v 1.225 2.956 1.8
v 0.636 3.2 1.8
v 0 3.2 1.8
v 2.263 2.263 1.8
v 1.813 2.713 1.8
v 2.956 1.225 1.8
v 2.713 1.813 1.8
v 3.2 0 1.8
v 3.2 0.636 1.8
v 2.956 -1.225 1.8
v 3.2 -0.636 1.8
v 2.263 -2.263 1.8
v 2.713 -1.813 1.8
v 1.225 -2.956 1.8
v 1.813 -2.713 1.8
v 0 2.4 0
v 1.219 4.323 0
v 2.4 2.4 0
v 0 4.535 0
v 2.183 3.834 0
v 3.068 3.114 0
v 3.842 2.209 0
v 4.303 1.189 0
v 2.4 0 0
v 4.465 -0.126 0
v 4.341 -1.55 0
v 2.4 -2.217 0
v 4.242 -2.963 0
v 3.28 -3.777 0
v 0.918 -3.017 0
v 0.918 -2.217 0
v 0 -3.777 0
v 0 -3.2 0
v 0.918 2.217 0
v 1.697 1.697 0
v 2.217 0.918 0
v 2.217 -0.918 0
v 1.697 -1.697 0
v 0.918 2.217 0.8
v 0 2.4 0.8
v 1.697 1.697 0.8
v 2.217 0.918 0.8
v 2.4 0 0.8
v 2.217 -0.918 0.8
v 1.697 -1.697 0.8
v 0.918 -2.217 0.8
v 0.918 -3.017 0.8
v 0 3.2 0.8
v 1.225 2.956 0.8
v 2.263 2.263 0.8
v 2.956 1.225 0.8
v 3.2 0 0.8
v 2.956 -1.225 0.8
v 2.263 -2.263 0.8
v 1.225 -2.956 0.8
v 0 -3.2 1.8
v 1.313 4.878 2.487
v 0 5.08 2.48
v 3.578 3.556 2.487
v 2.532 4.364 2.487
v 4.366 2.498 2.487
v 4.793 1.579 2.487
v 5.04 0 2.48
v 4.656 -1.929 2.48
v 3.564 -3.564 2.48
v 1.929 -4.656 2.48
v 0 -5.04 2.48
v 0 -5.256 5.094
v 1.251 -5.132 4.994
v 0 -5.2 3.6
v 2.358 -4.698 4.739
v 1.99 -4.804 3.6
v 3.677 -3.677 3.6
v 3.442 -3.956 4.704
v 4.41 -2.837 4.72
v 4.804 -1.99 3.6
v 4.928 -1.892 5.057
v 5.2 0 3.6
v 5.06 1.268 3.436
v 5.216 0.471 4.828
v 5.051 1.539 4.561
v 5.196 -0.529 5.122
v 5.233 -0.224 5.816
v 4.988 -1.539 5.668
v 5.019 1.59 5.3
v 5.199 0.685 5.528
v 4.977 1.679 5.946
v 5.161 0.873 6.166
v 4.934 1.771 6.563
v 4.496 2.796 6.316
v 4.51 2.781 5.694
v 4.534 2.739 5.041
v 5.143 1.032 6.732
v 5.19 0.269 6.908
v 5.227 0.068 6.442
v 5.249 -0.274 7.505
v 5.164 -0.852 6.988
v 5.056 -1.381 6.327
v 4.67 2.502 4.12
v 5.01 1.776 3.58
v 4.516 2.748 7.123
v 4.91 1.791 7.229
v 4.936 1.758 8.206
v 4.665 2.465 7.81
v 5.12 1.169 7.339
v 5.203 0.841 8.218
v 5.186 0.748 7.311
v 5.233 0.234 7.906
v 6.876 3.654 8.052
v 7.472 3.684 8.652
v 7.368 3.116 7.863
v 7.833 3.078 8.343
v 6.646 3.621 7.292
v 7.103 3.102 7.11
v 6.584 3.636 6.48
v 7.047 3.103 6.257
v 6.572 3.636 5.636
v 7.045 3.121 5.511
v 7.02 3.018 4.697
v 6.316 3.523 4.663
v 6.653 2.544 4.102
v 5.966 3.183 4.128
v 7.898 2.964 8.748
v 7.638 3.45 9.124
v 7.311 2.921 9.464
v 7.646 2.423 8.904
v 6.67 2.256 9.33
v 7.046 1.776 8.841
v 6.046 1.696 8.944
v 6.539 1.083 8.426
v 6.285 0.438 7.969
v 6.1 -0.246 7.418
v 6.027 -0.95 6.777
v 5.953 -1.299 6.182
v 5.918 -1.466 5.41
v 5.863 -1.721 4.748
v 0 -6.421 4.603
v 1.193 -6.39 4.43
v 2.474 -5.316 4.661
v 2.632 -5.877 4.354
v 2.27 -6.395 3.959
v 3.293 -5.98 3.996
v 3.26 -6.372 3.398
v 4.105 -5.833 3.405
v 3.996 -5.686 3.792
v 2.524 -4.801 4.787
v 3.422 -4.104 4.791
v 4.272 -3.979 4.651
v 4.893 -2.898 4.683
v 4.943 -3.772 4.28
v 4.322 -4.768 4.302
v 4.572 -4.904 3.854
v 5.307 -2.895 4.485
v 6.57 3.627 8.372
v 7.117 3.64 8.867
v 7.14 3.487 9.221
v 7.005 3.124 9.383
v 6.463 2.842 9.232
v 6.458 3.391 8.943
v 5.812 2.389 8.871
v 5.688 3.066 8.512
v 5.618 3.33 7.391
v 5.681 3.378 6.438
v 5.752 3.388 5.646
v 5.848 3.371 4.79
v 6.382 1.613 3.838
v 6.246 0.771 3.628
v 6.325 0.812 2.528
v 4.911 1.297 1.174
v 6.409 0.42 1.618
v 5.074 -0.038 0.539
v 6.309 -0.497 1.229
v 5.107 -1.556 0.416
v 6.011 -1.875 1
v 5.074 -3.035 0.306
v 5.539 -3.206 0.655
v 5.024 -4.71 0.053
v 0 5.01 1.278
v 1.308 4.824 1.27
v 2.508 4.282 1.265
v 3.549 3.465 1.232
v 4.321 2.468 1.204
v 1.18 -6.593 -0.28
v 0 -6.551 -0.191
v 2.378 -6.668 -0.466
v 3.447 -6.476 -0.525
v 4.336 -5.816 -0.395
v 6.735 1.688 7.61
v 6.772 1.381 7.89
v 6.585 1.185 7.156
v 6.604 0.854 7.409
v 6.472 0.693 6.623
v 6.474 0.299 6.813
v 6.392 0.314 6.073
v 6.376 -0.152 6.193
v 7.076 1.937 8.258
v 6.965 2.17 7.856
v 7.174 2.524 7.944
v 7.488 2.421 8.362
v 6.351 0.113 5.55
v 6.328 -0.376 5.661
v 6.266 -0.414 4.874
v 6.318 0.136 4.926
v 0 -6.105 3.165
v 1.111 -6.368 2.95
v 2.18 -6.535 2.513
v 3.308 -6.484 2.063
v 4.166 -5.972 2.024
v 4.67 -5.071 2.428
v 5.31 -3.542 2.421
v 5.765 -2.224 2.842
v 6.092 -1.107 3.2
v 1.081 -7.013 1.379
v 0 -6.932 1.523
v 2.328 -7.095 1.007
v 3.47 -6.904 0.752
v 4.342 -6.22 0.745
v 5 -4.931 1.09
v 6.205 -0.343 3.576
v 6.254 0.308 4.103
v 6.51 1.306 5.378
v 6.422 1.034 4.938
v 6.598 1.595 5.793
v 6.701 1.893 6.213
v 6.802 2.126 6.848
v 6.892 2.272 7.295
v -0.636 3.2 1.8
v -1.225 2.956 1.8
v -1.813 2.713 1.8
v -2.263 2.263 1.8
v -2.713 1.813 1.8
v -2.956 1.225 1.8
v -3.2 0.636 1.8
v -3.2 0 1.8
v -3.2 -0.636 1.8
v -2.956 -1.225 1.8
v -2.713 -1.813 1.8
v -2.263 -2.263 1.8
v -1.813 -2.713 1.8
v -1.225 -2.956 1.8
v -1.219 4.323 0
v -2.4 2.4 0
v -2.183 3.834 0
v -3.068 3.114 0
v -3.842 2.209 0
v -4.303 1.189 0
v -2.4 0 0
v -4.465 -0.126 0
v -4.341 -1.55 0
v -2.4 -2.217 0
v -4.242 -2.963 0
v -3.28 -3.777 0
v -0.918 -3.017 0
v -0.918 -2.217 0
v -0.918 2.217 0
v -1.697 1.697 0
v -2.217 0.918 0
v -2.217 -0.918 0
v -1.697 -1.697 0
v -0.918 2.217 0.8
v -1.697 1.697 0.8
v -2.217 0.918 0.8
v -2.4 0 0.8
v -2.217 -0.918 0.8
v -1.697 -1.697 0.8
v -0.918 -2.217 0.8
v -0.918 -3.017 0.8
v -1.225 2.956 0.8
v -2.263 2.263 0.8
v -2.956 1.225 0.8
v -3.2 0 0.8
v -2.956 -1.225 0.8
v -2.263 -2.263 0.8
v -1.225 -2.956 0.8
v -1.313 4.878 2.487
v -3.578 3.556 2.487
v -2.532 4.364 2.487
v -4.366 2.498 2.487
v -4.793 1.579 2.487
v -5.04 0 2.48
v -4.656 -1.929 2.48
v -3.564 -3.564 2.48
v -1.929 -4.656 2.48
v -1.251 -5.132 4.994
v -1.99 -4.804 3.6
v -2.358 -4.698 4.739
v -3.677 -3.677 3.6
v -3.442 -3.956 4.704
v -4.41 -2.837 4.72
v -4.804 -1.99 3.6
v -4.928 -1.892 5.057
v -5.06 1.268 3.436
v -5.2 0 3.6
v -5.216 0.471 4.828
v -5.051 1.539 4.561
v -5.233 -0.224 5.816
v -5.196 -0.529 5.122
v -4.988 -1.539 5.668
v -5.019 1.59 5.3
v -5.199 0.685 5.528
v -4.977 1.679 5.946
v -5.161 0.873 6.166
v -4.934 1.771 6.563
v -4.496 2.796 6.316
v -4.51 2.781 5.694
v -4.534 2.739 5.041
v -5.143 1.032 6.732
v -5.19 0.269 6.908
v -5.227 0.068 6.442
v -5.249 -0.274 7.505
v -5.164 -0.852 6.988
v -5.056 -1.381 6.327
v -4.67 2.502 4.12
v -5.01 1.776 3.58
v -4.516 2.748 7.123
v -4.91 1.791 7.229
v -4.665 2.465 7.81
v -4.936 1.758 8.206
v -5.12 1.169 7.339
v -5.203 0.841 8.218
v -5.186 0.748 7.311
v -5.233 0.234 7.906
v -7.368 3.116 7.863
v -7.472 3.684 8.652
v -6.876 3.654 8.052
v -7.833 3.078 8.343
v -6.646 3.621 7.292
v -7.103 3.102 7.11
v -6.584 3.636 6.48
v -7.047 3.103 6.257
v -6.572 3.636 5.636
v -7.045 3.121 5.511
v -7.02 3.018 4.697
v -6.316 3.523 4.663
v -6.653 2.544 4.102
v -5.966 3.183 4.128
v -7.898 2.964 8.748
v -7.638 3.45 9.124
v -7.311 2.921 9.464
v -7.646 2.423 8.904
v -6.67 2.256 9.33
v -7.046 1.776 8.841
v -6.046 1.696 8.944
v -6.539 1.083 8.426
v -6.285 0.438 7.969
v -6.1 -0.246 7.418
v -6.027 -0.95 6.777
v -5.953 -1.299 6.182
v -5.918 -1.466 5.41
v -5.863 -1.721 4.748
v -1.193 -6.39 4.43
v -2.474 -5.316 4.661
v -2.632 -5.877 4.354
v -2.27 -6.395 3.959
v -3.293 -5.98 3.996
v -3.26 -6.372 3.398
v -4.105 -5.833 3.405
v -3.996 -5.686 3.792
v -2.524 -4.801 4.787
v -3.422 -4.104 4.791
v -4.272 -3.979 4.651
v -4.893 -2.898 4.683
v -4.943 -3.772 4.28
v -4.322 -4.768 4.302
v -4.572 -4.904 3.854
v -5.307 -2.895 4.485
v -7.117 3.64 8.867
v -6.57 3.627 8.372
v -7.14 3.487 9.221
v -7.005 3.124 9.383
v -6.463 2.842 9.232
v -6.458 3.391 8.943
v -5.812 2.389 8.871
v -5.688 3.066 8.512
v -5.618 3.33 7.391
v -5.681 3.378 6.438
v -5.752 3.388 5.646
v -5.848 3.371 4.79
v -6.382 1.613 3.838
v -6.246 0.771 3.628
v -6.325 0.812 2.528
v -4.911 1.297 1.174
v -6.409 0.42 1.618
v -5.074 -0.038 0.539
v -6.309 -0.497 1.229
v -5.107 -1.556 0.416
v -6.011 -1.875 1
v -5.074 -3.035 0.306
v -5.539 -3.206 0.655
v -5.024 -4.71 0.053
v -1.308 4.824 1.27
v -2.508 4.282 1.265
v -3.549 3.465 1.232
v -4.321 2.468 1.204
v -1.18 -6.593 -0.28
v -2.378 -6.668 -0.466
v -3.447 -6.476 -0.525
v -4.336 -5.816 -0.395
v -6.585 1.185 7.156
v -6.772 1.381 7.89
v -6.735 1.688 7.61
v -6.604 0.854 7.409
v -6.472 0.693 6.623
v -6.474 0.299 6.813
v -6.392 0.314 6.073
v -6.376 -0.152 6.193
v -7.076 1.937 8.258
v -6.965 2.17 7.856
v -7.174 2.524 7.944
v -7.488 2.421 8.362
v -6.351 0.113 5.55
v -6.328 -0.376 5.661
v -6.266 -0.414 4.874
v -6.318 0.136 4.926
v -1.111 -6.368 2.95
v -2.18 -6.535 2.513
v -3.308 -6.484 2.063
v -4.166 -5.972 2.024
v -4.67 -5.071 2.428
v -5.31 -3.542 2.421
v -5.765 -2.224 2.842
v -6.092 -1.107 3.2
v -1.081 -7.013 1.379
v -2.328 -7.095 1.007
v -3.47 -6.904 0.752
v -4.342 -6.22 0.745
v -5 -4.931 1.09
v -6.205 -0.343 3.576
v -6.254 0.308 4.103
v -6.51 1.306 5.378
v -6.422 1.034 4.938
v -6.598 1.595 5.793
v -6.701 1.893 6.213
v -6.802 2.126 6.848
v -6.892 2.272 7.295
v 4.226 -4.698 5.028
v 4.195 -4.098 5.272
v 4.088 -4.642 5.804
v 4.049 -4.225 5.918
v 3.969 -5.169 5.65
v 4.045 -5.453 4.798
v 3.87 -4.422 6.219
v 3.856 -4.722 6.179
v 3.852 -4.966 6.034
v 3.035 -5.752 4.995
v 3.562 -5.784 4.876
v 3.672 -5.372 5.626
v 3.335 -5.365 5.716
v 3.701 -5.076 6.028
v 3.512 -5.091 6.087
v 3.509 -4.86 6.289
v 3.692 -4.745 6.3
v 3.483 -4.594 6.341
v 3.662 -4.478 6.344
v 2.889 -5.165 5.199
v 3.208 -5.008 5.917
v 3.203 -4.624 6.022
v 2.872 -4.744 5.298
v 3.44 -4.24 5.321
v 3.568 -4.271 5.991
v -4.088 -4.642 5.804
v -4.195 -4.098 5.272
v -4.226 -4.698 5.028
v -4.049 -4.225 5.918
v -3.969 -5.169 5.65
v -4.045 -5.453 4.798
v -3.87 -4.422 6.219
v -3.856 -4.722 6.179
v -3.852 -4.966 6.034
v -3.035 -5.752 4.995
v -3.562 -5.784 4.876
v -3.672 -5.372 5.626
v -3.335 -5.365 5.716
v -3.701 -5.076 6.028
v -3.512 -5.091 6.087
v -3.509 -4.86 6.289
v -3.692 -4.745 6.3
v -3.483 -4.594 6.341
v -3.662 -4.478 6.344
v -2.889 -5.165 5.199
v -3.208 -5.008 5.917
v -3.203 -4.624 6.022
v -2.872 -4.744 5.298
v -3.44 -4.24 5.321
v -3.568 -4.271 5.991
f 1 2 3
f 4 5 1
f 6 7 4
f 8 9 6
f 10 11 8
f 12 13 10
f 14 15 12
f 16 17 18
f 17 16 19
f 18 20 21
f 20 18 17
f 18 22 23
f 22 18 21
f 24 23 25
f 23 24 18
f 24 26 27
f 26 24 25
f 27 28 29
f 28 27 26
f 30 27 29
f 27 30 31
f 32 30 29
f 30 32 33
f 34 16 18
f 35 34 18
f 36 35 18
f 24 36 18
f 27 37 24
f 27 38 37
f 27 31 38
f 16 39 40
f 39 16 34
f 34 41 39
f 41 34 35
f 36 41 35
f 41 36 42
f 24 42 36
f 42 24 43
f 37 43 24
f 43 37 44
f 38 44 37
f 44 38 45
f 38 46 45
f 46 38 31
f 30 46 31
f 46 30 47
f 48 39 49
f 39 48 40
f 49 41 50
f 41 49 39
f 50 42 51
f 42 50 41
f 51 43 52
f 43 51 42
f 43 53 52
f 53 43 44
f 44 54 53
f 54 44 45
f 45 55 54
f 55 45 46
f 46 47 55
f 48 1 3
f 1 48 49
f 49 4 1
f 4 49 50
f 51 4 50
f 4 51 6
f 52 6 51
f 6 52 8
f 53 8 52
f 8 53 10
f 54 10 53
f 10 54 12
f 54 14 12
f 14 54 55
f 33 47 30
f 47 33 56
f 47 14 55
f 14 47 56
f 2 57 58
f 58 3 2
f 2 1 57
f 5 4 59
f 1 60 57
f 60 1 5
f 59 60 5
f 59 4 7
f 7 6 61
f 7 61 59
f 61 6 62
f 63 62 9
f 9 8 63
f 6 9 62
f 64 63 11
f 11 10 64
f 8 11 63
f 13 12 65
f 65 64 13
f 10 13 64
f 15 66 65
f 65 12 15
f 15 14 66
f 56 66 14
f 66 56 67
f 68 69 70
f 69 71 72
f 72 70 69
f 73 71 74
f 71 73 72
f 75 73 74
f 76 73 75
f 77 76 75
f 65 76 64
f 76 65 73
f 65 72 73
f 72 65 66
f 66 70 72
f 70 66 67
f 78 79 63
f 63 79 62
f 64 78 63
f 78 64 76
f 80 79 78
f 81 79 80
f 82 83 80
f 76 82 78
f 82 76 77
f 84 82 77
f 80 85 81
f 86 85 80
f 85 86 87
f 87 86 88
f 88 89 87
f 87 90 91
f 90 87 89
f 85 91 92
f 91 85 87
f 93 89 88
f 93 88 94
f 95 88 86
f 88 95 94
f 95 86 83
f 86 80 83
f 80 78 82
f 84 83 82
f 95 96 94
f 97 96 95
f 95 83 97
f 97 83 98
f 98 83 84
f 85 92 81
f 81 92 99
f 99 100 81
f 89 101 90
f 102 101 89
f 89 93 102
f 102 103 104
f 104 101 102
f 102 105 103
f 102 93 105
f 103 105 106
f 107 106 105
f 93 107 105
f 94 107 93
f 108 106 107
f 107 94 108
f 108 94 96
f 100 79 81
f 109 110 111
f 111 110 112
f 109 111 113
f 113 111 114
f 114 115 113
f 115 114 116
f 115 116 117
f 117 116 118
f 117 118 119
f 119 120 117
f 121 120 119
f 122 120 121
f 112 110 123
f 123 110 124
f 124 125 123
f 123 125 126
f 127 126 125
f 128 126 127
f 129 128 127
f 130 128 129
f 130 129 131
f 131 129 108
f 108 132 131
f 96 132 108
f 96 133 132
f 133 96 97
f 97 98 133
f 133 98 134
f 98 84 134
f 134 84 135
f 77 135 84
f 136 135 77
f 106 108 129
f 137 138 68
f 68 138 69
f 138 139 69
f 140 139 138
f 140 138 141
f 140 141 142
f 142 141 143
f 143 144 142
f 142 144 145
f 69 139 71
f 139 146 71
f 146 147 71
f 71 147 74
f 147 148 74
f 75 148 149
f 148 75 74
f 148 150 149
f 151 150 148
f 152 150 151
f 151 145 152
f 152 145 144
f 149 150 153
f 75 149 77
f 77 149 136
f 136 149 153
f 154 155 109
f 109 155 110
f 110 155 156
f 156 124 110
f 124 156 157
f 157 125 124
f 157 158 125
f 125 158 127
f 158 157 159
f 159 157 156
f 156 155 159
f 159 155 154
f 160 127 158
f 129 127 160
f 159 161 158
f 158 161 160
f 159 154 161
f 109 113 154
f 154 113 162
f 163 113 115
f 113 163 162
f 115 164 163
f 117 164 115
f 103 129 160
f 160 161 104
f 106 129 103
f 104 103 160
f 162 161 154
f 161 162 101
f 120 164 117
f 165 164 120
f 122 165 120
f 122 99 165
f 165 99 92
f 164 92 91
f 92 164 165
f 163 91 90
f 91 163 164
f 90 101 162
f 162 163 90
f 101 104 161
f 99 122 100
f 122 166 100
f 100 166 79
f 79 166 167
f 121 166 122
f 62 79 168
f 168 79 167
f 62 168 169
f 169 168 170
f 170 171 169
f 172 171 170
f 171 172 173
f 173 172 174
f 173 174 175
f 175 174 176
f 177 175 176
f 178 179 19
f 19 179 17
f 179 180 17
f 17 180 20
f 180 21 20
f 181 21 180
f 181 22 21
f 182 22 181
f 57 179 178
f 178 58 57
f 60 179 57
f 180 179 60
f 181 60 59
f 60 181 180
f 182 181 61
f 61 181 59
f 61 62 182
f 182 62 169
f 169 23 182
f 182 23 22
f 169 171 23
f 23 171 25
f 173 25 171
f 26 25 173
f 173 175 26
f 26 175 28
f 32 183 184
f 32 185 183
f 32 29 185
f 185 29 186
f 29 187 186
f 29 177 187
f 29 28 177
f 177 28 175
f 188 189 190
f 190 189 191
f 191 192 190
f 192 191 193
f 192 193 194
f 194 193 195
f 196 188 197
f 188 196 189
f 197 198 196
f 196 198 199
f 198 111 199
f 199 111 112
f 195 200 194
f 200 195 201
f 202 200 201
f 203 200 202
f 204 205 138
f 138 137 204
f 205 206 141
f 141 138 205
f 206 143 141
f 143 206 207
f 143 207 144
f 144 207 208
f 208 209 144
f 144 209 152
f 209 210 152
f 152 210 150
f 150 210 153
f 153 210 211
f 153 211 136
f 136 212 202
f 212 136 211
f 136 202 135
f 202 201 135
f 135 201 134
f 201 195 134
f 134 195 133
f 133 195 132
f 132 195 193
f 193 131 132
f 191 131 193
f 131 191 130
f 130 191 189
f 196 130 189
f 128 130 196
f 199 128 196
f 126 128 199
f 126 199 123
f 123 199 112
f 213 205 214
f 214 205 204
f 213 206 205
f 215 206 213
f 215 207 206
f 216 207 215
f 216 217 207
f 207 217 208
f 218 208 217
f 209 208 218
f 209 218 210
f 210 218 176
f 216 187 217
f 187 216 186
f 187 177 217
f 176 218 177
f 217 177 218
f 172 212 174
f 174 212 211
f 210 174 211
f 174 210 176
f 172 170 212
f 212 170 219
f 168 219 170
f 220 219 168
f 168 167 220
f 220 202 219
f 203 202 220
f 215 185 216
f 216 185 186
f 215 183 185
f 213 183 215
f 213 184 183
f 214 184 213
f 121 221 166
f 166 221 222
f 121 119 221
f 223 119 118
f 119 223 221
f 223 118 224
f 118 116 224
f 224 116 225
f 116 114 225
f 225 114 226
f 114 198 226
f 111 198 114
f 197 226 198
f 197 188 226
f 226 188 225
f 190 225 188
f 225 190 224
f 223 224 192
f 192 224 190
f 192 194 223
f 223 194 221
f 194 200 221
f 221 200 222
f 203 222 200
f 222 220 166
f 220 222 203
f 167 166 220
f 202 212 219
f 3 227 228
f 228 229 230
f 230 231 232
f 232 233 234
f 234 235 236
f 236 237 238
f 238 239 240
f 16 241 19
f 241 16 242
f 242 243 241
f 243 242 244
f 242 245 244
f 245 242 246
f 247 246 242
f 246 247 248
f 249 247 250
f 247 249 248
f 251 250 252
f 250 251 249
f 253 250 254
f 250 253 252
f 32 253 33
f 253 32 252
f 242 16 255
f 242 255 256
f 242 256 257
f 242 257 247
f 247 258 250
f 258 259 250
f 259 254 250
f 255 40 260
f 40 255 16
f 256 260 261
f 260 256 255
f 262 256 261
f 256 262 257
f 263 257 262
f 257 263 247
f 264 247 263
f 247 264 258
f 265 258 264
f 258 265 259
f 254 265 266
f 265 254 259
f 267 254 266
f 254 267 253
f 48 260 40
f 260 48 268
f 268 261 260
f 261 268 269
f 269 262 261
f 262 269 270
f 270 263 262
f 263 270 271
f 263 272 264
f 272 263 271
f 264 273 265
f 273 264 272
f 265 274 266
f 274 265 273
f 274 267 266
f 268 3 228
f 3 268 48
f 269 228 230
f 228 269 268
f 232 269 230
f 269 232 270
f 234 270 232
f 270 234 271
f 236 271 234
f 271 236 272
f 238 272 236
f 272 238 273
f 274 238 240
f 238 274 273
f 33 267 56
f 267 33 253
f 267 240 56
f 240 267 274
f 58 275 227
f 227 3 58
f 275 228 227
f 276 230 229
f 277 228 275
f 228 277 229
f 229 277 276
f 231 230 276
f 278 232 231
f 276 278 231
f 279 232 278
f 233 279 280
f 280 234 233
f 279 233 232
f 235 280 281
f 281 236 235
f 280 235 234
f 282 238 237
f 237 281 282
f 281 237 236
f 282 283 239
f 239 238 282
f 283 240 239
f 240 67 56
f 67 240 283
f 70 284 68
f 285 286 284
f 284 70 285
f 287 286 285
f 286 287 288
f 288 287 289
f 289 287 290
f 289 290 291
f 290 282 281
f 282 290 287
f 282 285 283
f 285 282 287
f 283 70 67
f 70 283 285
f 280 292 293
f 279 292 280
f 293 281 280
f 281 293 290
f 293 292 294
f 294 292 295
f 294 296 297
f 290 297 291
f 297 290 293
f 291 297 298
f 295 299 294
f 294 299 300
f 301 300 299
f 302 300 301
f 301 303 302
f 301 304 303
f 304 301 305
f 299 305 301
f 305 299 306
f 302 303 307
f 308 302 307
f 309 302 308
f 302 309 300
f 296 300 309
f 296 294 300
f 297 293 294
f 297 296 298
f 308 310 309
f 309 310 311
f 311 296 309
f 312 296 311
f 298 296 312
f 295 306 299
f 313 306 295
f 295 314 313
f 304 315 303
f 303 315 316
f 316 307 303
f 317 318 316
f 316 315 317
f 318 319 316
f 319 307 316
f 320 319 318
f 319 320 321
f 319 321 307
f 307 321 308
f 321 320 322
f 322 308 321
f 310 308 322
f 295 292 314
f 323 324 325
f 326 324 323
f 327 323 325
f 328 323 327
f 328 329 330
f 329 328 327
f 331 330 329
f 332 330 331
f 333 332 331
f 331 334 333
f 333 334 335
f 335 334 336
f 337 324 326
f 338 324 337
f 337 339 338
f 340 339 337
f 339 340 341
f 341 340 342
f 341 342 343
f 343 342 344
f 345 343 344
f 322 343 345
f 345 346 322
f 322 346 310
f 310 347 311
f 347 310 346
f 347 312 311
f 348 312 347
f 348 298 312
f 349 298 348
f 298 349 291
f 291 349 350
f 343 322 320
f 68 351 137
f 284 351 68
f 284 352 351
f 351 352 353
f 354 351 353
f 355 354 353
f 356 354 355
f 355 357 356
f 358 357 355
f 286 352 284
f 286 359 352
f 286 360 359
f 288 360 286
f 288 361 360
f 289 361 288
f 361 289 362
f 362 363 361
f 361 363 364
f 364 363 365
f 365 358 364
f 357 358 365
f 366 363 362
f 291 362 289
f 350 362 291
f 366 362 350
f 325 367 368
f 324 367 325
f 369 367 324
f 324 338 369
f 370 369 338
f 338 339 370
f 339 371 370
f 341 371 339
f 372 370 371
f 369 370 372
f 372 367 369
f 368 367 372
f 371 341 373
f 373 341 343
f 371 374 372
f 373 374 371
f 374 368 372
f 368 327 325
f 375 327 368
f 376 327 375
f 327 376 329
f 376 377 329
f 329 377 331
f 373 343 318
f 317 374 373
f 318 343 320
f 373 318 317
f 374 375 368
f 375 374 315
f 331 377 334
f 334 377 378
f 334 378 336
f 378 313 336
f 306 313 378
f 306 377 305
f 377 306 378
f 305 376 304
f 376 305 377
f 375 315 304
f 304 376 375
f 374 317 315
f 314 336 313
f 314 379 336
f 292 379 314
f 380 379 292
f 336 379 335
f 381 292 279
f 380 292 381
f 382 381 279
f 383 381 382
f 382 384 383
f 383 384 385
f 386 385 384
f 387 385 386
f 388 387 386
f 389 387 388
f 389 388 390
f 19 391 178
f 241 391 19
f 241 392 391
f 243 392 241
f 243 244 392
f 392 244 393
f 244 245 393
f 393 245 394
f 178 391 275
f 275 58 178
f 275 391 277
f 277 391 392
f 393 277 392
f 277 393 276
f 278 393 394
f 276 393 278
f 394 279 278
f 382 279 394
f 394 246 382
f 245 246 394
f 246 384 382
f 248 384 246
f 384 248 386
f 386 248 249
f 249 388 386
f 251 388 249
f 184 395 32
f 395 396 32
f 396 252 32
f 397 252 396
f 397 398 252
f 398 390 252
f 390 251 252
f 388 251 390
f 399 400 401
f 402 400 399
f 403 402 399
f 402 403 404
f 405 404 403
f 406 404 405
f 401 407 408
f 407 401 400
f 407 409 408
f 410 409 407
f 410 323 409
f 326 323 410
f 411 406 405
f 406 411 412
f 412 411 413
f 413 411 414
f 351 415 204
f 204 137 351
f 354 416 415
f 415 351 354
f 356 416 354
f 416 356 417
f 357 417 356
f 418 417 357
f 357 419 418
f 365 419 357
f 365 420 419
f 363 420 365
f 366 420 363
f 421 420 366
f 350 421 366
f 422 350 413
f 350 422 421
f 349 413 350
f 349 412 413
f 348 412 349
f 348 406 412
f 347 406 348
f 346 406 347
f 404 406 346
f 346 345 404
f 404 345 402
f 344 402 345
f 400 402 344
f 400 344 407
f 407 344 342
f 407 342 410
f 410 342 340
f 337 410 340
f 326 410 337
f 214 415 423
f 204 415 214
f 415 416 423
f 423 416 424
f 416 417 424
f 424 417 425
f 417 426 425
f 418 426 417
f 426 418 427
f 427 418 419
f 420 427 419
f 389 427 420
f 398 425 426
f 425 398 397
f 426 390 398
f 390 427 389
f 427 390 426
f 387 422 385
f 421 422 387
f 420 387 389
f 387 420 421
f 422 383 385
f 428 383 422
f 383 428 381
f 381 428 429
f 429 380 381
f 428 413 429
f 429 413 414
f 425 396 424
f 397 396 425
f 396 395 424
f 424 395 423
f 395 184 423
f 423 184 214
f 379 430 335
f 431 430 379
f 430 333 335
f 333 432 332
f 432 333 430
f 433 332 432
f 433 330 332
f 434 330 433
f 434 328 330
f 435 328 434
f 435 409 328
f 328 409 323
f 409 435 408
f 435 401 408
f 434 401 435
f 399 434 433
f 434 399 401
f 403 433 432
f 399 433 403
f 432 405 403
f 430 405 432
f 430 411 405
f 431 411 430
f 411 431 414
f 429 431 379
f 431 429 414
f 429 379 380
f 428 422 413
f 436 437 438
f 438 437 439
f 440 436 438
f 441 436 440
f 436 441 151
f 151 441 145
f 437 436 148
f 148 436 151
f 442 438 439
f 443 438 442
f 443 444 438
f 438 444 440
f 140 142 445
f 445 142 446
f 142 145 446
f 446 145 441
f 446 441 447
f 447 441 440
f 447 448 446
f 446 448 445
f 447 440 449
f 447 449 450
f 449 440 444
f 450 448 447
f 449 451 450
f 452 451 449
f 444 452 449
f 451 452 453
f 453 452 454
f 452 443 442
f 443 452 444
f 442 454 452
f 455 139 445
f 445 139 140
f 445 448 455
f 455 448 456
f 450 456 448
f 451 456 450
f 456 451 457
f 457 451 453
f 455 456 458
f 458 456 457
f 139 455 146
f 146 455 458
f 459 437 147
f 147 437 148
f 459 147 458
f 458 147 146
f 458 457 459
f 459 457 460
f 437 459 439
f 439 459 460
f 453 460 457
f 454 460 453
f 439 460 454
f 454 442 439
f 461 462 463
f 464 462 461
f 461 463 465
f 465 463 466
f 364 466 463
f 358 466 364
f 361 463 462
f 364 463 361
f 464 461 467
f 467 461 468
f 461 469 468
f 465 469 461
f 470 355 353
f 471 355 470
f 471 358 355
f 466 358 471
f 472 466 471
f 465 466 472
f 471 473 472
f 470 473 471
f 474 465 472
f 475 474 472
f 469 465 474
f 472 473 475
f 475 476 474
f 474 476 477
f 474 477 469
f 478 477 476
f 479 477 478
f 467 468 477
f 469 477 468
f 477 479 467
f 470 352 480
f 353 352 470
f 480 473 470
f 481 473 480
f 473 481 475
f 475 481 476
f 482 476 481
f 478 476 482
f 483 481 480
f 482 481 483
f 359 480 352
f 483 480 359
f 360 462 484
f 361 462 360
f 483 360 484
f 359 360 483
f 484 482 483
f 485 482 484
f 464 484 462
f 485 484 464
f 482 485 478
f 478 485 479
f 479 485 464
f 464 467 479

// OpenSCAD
use <../lib.scad>
use <s/2576s01.scad>
use <s/2576s03.scad>
function ldraw_lib__2576() = [
// 0 Minifig Large Lower Jaw with Canines and Pointed Ears
// 0 Name: 2576.dat
// 0 Author: Gerald Lasser [GeraldLasser]
// 0 !LDRAW_ORG Part UPDATE 2026-07
// 0 !LICENSE Licensed under CC BY 4.0 : see CAreadme.txt
// 
// 0 BFC CERTIFY CCW
  [0,"BFC","CERTIFY"],
  [0,"BFC","CCW"],
// 
// 0 !CATEGORY Minifig Neckwear
// 
// 0 !HISTORY 2025-01-27 {LEGO Instructions App} Original part shape
// 0 !HISTORY 2025-01-27 [GeraldLasser] File preparation for LDraw Parts Tracker
// 0 !HISTORY 2026-07-30 [OrionP] Official Update 2026-07
// 
// 1 16 0 0 0 1 0 0 0 1 0 0 0 1 s\2576s01.dat
  [1,16,0,0,0,1,0,0,0,1,0,0,0,1, ldraw_lib__s__2576s01()],
// 
// 1 16 0 0 0 1 0 0 0 1 0 0 0 1 s\2576s03.dat
  [1,16,0,0,0,1,0,0,0,1,0,0,0,1, ldraw_lib__s__2576s03()],
// 1 16 0 0 0 -1 0 0 0 1 0 0 0 1 s\2576s03.dat
  [1,16,0,0,0,-1,0,0,0,1,0,0,0,1, ldraw_lib__s__2576s03()],
];
module ldraw_lib__2576(step=0, col=false, unit=2/5, alt=false, line=0.2, solid=!$preview)
    makepoly(ldraw_lib__2576(), step=step, col=col, unit=unit, alt=alt, line=line, solid=solid);
ldraw_lib__2576(line=0.2);
